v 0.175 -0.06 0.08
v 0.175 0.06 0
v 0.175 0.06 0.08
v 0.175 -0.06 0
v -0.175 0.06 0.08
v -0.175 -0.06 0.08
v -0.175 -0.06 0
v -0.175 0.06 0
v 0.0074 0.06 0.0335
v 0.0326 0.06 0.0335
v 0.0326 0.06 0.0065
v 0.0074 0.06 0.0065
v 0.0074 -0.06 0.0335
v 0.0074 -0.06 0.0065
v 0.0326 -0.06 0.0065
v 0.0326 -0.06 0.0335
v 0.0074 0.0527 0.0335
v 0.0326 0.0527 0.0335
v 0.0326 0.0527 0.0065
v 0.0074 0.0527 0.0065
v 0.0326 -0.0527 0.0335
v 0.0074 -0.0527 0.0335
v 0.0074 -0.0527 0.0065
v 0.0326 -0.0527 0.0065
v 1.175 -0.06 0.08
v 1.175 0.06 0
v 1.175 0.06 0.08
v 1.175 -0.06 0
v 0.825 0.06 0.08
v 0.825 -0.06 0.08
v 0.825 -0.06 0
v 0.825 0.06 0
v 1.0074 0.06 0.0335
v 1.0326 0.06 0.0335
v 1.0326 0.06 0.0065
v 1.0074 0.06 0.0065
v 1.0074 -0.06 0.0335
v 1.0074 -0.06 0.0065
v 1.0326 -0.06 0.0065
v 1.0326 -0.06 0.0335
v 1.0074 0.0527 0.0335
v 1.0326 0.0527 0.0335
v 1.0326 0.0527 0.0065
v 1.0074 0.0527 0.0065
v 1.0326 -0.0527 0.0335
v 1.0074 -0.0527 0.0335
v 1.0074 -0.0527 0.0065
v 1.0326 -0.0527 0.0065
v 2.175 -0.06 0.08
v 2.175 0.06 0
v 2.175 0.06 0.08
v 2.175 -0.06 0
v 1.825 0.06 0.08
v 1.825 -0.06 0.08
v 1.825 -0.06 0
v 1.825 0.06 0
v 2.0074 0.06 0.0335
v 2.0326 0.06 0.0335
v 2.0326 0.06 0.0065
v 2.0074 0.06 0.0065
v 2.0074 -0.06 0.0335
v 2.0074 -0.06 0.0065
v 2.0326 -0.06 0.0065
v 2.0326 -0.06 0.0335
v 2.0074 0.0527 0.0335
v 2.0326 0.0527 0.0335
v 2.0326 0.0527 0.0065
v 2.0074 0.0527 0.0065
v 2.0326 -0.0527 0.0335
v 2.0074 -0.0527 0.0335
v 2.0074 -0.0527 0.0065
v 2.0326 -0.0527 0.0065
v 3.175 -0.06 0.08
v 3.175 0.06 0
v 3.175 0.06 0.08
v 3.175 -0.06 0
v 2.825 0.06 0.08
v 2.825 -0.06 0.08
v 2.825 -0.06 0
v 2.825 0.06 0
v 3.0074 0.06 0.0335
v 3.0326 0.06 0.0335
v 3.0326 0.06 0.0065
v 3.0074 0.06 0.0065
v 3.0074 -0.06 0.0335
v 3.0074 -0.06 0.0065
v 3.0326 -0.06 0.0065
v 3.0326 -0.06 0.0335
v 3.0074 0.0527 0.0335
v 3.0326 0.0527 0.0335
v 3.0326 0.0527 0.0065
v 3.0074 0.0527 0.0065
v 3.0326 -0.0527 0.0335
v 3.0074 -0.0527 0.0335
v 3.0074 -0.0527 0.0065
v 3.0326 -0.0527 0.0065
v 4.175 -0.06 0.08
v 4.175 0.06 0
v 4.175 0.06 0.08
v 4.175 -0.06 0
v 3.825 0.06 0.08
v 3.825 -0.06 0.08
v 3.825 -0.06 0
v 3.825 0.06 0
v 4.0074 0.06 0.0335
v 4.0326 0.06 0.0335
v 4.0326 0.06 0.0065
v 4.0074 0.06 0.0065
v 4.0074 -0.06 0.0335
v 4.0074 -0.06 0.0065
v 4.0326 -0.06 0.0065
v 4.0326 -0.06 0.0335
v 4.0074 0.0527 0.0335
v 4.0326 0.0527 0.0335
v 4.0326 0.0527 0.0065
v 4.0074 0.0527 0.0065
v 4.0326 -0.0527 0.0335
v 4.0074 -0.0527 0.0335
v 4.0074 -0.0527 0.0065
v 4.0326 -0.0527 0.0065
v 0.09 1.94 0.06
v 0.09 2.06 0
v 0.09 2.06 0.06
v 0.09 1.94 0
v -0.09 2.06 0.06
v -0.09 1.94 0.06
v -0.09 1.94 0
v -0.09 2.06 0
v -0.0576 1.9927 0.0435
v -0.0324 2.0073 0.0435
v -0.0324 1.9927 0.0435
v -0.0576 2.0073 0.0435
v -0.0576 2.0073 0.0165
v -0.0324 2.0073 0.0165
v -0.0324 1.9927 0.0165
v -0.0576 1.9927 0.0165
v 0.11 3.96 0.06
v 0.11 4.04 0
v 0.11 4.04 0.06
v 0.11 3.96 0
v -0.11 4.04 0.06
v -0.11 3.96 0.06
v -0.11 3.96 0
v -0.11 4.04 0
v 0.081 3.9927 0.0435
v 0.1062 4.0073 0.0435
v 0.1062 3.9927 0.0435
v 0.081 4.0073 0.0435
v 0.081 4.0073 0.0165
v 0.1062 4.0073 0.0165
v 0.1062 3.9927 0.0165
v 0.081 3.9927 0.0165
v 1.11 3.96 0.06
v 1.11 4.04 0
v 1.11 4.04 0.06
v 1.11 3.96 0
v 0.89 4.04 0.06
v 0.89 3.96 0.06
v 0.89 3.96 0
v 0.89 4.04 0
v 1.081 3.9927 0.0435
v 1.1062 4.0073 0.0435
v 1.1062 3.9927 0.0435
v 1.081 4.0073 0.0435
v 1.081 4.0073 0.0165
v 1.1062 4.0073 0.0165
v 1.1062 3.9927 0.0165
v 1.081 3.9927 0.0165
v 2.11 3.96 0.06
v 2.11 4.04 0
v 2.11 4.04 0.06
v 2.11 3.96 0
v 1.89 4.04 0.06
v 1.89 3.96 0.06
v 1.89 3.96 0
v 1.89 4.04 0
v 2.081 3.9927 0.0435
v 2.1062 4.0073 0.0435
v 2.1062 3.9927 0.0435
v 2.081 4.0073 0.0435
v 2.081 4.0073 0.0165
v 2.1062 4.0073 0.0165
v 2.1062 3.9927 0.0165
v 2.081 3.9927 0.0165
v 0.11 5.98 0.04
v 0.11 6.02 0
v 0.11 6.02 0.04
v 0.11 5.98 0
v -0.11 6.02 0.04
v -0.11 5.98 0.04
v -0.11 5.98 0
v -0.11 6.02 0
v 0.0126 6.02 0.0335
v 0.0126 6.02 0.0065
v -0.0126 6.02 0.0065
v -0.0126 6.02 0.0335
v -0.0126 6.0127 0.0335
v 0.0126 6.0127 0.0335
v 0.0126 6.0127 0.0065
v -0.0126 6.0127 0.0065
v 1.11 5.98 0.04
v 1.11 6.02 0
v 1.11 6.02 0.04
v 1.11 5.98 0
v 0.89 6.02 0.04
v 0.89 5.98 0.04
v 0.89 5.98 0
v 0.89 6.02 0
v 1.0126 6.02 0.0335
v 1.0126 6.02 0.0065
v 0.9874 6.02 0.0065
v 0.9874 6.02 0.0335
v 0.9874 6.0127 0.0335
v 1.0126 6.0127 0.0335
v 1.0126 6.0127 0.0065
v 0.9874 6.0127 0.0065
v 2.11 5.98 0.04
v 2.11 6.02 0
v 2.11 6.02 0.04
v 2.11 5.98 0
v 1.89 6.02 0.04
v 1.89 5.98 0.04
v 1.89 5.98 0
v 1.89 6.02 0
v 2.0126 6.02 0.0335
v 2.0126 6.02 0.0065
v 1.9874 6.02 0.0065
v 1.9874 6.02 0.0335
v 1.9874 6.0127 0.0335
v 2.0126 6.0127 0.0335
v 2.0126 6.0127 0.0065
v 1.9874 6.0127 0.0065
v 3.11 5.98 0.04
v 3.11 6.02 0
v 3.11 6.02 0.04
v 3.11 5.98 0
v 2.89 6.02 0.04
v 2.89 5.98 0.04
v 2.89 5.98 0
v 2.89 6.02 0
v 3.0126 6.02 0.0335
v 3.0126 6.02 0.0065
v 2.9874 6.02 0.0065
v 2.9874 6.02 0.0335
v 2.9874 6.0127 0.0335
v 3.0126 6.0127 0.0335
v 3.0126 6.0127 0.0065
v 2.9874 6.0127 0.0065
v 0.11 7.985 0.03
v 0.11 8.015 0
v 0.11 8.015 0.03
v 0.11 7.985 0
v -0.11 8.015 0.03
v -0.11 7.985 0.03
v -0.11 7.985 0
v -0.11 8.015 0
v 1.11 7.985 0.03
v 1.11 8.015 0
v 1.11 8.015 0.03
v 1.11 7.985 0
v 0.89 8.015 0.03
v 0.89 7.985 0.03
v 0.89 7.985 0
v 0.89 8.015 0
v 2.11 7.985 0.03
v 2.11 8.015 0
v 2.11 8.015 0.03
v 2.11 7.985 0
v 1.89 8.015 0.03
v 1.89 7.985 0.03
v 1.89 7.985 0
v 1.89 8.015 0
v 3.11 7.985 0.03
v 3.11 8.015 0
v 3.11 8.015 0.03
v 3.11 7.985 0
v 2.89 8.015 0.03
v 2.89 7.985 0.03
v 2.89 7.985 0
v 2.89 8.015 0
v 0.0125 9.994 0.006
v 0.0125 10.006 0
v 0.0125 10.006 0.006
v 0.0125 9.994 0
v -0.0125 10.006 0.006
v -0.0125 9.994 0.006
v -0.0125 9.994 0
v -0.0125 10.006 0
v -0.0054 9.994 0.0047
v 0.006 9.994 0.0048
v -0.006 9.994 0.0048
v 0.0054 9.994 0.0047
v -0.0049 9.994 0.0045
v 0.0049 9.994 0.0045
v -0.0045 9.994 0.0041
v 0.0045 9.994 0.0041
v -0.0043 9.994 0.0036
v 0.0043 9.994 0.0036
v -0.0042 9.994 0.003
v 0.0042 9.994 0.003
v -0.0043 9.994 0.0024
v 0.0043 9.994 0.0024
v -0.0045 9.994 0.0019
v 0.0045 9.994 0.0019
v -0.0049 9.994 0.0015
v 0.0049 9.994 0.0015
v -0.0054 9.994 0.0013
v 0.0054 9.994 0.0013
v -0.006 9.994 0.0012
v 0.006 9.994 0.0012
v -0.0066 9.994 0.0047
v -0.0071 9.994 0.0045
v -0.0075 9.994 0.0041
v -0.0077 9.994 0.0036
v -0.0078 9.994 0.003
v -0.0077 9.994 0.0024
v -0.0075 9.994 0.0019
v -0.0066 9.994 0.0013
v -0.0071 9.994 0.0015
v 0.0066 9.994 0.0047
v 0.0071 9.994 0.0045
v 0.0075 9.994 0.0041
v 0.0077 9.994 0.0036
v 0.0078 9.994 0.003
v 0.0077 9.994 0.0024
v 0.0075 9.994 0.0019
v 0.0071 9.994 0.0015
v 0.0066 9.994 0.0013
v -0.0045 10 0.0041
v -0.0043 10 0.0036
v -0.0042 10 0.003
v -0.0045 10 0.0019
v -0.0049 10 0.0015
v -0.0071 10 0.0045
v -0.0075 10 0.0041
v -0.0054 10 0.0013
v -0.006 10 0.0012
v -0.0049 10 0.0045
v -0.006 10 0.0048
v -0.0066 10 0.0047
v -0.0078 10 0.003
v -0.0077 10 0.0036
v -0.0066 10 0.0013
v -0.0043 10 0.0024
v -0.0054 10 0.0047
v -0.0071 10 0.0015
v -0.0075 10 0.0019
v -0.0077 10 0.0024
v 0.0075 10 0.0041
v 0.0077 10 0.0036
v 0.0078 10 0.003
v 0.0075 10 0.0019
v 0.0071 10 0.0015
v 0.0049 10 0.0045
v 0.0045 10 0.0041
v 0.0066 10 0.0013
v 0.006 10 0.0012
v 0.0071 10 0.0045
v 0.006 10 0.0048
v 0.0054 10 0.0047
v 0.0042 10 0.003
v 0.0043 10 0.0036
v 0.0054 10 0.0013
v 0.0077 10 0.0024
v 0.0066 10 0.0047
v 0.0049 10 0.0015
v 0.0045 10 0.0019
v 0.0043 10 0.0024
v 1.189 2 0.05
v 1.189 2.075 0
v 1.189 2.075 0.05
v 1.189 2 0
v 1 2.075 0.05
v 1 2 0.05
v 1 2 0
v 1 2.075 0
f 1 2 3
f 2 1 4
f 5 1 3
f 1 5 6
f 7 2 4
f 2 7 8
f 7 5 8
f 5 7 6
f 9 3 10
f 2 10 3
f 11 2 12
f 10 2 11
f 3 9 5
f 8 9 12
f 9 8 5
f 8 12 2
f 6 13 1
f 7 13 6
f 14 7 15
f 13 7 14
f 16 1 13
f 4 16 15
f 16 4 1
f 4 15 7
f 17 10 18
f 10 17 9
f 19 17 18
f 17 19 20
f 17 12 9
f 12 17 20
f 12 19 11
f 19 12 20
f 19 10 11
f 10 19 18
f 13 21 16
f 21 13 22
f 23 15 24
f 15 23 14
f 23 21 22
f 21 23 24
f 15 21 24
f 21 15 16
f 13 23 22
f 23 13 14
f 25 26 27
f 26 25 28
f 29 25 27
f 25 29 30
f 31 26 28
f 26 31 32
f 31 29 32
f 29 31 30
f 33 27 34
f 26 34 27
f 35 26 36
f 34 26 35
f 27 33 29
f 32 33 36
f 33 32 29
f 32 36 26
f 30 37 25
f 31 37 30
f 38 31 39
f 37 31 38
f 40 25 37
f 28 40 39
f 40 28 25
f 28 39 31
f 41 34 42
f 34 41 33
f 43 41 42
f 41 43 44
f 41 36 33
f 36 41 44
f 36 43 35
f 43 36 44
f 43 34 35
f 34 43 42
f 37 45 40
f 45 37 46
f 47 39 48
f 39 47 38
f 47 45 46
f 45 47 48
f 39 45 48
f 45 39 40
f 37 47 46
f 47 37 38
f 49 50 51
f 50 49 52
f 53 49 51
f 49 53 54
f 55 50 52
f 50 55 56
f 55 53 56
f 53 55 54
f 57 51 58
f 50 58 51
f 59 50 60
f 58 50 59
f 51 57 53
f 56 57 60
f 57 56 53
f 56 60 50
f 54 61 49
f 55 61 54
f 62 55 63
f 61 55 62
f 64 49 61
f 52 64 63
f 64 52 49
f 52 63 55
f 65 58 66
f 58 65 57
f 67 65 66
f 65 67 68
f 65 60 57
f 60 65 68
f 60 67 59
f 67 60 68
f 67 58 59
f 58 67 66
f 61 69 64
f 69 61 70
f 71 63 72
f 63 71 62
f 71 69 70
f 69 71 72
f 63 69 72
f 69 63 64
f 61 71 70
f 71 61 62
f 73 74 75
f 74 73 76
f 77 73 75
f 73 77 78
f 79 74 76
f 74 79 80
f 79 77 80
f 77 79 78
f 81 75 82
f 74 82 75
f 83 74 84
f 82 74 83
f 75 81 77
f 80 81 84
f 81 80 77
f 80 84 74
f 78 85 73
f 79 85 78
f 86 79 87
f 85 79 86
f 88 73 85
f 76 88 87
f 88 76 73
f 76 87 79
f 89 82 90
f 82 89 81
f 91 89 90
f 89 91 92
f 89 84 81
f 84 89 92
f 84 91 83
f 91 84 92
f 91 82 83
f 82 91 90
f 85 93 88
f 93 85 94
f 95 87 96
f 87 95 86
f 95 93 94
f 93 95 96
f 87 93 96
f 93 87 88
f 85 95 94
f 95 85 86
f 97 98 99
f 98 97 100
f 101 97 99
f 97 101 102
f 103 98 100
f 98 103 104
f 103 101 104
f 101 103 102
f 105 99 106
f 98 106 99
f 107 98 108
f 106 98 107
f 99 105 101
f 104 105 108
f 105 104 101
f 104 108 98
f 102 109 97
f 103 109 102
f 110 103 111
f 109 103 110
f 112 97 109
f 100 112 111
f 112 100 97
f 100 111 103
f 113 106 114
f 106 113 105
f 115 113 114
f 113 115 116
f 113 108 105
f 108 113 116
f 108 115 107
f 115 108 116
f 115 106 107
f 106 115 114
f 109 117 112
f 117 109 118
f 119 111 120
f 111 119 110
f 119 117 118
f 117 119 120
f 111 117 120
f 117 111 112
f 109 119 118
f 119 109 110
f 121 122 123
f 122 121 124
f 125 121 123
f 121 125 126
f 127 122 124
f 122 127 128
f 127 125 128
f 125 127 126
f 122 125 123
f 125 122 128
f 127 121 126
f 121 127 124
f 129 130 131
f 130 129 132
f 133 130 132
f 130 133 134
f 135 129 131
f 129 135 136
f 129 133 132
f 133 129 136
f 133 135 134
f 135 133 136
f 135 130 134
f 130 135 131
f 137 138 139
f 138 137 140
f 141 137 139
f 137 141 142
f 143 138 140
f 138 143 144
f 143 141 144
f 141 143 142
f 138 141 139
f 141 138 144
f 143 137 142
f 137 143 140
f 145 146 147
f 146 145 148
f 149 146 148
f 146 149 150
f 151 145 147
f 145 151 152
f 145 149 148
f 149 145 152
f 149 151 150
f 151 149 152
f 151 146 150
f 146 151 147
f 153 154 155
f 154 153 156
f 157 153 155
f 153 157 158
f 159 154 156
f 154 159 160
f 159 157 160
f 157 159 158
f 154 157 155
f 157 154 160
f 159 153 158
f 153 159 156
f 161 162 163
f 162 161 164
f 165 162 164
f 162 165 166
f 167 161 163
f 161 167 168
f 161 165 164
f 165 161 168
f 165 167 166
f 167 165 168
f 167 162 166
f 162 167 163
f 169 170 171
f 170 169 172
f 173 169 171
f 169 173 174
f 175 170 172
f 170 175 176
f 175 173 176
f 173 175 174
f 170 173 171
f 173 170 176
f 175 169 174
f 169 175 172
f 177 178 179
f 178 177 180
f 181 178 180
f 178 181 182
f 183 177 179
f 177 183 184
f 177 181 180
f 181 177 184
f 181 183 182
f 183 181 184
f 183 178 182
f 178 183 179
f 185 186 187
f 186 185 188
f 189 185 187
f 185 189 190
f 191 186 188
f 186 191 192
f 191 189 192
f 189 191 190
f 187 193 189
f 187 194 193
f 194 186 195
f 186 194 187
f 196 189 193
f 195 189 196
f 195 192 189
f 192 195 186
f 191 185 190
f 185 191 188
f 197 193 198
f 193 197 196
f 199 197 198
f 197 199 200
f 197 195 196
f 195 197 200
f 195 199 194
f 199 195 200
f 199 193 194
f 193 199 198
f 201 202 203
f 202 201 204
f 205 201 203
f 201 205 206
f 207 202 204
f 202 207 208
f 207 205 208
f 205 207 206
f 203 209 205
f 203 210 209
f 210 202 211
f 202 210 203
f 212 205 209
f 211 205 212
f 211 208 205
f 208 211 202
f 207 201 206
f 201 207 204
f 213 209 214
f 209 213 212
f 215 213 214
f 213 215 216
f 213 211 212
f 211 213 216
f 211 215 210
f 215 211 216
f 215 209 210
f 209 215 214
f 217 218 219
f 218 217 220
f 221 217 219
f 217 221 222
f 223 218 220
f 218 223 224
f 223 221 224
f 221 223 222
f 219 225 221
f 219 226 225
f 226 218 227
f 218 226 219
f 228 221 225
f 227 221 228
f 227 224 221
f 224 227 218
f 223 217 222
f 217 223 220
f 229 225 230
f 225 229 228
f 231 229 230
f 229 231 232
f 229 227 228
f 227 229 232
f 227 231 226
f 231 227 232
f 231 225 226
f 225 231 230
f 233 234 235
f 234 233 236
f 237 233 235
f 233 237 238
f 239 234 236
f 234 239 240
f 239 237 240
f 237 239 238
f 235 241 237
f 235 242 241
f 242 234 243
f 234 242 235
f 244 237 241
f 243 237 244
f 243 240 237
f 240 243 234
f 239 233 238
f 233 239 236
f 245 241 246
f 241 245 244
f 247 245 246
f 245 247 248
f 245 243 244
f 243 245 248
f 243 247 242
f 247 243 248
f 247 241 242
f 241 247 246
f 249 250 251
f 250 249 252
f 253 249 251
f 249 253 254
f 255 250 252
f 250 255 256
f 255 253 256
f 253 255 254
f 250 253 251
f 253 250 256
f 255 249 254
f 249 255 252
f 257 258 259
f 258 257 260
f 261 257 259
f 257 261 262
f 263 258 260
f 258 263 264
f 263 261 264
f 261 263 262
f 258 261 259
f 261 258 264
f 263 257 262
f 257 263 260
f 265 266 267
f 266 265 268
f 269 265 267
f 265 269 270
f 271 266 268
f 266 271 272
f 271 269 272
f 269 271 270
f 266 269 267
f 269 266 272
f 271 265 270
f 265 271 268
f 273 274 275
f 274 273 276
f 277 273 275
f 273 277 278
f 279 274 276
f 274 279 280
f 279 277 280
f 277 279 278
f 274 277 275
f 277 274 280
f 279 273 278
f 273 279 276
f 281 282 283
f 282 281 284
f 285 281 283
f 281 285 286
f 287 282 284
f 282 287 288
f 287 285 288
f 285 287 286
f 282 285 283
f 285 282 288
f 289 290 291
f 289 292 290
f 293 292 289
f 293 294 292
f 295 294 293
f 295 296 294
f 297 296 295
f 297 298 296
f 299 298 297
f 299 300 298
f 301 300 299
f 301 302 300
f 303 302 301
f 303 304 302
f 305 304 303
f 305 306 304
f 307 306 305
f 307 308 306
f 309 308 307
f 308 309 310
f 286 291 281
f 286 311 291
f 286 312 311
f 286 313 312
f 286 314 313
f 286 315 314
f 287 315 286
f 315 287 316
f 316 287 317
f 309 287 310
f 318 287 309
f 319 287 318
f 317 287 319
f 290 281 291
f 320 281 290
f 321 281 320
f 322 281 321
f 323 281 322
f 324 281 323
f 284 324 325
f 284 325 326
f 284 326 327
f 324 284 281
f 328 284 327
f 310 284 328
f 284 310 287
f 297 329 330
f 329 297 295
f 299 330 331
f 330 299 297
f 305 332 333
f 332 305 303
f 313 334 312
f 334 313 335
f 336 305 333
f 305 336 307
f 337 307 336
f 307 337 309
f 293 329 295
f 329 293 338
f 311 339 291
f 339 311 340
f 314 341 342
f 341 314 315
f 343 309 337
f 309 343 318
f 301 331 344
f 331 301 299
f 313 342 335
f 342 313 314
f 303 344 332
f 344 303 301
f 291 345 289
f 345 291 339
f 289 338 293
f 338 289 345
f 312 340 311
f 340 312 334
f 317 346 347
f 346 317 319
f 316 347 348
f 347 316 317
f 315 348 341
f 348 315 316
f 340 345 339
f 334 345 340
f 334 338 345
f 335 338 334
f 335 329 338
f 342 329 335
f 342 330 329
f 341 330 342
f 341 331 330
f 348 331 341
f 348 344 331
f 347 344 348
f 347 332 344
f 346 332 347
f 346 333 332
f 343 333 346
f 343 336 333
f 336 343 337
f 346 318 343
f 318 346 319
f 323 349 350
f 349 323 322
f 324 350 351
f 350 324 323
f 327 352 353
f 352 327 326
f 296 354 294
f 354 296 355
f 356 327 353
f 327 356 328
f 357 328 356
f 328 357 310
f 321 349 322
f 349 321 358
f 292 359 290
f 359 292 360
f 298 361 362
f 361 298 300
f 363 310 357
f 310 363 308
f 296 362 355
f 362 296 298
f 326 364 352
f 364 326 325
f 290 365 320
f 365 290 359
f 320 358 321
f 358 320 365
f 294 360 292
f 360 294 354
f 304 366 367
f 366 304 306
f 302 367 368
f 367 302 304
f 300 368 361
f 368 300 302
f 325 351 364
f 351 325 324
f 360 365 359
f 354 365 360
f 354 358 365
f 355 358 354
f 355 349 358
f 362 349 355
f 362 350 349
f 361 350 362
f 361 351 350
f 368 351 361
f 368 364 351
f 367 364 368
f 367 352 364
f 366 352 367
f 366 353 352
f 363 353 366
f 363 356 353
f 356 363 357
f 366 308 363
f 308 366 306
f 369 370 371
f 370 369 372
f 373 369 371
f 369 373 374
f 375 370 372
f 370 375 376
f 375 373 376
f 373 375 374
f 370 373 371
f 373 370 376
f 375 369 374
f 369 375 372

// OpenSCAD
//
// lizard_export_parts.scad
// All parts placed in separate locations for easy STL export
// MG90S ONLY configuration
// Units: meters (scale by 1000 in slicer if needed)
// ---------------------------------------------------------------------------

// ------------------------
// GLOBAL CONFIG
// ------------------------
UNIT_SCALE = 1;        // 1 = meters, 1000 = mm
SERVO_CLEARANCE = 0.0012;  // 1.2mm clearance around MG90S
RIGID_ONE_PIECE = false;   // false = 5 separate body segments, true = one-piece torso

// MG90S servo footprint (meters)
SERVO_L = 0.0228;
SERVO_W = 0.0122;
SERVO_H = 0.0285;
SERVO_BODY = [SERVO_L, SERVO_W, SERVO_H];

// lizard URDF geometry
body_length = 0.35;
body_width  = 0.12;
body_height = 0.08;

tail_length = 0.22;
tail_width  = 0.08;
tail_height = 0.06;

head_length = 0.18;
head_width  = 0.12;
head_height = 0.06;

leg_length = 0.22;
hip_y_offset = 0.12;
hip_z_offset = 0.02;

// ------------------------
// HELPERS
// ------------------------
module servo_pocket(orient="y", clearance=SERVO_CLEARANCE, depth=SERVO_H*0.95) {
    pocket_L = SERVO_L + 2*clearance;
    pocket_W = SERVO_W + 2*clearance;
    pocket_H = depth;

    if (orient=="y")
        translate([-pocket_W/2, -pocket_L/2, -pocket_H/2])
            cube([pocket_W, pocket_L, pocket_H]);
}

module body_segment_with_pockets() {
    difference() {
        // main box
        translate([-body_length/2, -body_width/2, 0])
            cube([body_length, body_width, body_height]);

        // left hip pocket
        translate([0.02, +body_width/2, hip_z_offset])
            rotate([0,0,90]) servo_pocket("y");

        // right hip pocket
        translate([0.02, -body_width/2, hip_z_offset])
            rotate([0,0,-90]) servo_pocket("y");
    }
}

module head_with_pockets() {
    difference() {
        translate([-head_length/2, -head_width/2, 0])
            cube([head_length, head_width, head_height]);

        // head servo pocket (nod axis)
        translate([-head_length*0.25, 0, head_height/2])
            rotate([0,0,90]) servo_pocket("y");
    }
}

module jaw_block() {
    cube([0.189, 0.075, 0.05]);
}

module tail_segment_with_pocket() {
    difference() {
        translate([-tail_length/2, -tail_width/2, 0])
            cube([tail_length, tail_width, tail_height]);
        translate([tail_length/2 - SERVO_L/2 - 0.005, 0, tail_height/2])
            rotate([0,0,90]) servo_pocket("y");
    }
}

module hip_module() {
    difference() {
        translate([-leg_length/2, -0.04/2, 0])
            cube([leg_length, 0.04, 0.04]);

        translate([0, 0.04/2, 0.02])
            rotate([0,0,90]) servo_pocket("y");
    }
}

module knee_module() {
    difference() {
        translate([-leg_length/2, -0.03/2, 0])
            cube([leg_length, 0.03, 0.03]);

        translate([leg_length*0.45, 0, -0.015])
            rotate([0,0,90]) servo_pocket("y");
    }
}

module servo_bracket_mg90s() {
    difference() {
        translate([-0.025/2, -0.012/2, 0]) cube([0.025,0.012,0.006]);
        // screw holes (simple through cylinders)
        translate([-0.006,0,0.003]) rotate([90,0,0]) cylinder(h=0.012, r=0.0018, $fn=20);
        translate([+0.006,0,0.003]) rotate([90,0,0]) cylinder(h=0.012, r=0.0018, $fn=20);
    }
}


// =====================================================================
// EXPORT BLOCK – EACH PART IN ITS OWN TRANSLATE REGION
// =====================================================================

// Body segments (or unified torso)
if (!RIGID_ONE_PIECE) {
    translate([0,0,0]) body_segment_with_pockets();                     // body_0
    translate([1,0,0]) body_segment_with_pockets();                     // body_1
    translate([2,0,0]) body_segment_with_pockets();                     // body_2
    translate([3,0,0]) body_segment_with_pockets();                     // body_3
    translate([4,0,0]) body_segment_with_pockets();                     // body_4
}
else {
    // one-piece rigid torso (rarely recommended but supported)
    translate([0,0,0])
        cube([5*body_length*0.9, body_width, body_height]);
}

// Head
translate([0,2,0]) head_with_pockets();

// Jaw
translate([1,2,0]) jaw_block();

// Tail segments
translate([0,4,0]) tail_segment_with_pocket();   // tail_0
translate([1,4,0]) tail_segment_with_pocket();   // tail_1
translate([2,4,0]) tail_segment_with_pocket();   // tail_2

// Hip modules
translate([0,6,0]) hip_module();                 // hip_0
translate([1,6,0]) hip_module();                 // hip_1
translate([2,6,0]) hip_module();                 // hip_2
translate([3,6,0]) hip_module();                 // hip_3

// Knee modules
translate([0,8,0]) knee_module();                // knee_0
translate([1,8,0]) knee_module();                // knee_1
translate([2,8,0]) knee_module();                // knee_2
translate([3,8,0]) knee_module();                // knee_3

// Brackets
translate([0,10,0]) servo_bracket_mg90s();
